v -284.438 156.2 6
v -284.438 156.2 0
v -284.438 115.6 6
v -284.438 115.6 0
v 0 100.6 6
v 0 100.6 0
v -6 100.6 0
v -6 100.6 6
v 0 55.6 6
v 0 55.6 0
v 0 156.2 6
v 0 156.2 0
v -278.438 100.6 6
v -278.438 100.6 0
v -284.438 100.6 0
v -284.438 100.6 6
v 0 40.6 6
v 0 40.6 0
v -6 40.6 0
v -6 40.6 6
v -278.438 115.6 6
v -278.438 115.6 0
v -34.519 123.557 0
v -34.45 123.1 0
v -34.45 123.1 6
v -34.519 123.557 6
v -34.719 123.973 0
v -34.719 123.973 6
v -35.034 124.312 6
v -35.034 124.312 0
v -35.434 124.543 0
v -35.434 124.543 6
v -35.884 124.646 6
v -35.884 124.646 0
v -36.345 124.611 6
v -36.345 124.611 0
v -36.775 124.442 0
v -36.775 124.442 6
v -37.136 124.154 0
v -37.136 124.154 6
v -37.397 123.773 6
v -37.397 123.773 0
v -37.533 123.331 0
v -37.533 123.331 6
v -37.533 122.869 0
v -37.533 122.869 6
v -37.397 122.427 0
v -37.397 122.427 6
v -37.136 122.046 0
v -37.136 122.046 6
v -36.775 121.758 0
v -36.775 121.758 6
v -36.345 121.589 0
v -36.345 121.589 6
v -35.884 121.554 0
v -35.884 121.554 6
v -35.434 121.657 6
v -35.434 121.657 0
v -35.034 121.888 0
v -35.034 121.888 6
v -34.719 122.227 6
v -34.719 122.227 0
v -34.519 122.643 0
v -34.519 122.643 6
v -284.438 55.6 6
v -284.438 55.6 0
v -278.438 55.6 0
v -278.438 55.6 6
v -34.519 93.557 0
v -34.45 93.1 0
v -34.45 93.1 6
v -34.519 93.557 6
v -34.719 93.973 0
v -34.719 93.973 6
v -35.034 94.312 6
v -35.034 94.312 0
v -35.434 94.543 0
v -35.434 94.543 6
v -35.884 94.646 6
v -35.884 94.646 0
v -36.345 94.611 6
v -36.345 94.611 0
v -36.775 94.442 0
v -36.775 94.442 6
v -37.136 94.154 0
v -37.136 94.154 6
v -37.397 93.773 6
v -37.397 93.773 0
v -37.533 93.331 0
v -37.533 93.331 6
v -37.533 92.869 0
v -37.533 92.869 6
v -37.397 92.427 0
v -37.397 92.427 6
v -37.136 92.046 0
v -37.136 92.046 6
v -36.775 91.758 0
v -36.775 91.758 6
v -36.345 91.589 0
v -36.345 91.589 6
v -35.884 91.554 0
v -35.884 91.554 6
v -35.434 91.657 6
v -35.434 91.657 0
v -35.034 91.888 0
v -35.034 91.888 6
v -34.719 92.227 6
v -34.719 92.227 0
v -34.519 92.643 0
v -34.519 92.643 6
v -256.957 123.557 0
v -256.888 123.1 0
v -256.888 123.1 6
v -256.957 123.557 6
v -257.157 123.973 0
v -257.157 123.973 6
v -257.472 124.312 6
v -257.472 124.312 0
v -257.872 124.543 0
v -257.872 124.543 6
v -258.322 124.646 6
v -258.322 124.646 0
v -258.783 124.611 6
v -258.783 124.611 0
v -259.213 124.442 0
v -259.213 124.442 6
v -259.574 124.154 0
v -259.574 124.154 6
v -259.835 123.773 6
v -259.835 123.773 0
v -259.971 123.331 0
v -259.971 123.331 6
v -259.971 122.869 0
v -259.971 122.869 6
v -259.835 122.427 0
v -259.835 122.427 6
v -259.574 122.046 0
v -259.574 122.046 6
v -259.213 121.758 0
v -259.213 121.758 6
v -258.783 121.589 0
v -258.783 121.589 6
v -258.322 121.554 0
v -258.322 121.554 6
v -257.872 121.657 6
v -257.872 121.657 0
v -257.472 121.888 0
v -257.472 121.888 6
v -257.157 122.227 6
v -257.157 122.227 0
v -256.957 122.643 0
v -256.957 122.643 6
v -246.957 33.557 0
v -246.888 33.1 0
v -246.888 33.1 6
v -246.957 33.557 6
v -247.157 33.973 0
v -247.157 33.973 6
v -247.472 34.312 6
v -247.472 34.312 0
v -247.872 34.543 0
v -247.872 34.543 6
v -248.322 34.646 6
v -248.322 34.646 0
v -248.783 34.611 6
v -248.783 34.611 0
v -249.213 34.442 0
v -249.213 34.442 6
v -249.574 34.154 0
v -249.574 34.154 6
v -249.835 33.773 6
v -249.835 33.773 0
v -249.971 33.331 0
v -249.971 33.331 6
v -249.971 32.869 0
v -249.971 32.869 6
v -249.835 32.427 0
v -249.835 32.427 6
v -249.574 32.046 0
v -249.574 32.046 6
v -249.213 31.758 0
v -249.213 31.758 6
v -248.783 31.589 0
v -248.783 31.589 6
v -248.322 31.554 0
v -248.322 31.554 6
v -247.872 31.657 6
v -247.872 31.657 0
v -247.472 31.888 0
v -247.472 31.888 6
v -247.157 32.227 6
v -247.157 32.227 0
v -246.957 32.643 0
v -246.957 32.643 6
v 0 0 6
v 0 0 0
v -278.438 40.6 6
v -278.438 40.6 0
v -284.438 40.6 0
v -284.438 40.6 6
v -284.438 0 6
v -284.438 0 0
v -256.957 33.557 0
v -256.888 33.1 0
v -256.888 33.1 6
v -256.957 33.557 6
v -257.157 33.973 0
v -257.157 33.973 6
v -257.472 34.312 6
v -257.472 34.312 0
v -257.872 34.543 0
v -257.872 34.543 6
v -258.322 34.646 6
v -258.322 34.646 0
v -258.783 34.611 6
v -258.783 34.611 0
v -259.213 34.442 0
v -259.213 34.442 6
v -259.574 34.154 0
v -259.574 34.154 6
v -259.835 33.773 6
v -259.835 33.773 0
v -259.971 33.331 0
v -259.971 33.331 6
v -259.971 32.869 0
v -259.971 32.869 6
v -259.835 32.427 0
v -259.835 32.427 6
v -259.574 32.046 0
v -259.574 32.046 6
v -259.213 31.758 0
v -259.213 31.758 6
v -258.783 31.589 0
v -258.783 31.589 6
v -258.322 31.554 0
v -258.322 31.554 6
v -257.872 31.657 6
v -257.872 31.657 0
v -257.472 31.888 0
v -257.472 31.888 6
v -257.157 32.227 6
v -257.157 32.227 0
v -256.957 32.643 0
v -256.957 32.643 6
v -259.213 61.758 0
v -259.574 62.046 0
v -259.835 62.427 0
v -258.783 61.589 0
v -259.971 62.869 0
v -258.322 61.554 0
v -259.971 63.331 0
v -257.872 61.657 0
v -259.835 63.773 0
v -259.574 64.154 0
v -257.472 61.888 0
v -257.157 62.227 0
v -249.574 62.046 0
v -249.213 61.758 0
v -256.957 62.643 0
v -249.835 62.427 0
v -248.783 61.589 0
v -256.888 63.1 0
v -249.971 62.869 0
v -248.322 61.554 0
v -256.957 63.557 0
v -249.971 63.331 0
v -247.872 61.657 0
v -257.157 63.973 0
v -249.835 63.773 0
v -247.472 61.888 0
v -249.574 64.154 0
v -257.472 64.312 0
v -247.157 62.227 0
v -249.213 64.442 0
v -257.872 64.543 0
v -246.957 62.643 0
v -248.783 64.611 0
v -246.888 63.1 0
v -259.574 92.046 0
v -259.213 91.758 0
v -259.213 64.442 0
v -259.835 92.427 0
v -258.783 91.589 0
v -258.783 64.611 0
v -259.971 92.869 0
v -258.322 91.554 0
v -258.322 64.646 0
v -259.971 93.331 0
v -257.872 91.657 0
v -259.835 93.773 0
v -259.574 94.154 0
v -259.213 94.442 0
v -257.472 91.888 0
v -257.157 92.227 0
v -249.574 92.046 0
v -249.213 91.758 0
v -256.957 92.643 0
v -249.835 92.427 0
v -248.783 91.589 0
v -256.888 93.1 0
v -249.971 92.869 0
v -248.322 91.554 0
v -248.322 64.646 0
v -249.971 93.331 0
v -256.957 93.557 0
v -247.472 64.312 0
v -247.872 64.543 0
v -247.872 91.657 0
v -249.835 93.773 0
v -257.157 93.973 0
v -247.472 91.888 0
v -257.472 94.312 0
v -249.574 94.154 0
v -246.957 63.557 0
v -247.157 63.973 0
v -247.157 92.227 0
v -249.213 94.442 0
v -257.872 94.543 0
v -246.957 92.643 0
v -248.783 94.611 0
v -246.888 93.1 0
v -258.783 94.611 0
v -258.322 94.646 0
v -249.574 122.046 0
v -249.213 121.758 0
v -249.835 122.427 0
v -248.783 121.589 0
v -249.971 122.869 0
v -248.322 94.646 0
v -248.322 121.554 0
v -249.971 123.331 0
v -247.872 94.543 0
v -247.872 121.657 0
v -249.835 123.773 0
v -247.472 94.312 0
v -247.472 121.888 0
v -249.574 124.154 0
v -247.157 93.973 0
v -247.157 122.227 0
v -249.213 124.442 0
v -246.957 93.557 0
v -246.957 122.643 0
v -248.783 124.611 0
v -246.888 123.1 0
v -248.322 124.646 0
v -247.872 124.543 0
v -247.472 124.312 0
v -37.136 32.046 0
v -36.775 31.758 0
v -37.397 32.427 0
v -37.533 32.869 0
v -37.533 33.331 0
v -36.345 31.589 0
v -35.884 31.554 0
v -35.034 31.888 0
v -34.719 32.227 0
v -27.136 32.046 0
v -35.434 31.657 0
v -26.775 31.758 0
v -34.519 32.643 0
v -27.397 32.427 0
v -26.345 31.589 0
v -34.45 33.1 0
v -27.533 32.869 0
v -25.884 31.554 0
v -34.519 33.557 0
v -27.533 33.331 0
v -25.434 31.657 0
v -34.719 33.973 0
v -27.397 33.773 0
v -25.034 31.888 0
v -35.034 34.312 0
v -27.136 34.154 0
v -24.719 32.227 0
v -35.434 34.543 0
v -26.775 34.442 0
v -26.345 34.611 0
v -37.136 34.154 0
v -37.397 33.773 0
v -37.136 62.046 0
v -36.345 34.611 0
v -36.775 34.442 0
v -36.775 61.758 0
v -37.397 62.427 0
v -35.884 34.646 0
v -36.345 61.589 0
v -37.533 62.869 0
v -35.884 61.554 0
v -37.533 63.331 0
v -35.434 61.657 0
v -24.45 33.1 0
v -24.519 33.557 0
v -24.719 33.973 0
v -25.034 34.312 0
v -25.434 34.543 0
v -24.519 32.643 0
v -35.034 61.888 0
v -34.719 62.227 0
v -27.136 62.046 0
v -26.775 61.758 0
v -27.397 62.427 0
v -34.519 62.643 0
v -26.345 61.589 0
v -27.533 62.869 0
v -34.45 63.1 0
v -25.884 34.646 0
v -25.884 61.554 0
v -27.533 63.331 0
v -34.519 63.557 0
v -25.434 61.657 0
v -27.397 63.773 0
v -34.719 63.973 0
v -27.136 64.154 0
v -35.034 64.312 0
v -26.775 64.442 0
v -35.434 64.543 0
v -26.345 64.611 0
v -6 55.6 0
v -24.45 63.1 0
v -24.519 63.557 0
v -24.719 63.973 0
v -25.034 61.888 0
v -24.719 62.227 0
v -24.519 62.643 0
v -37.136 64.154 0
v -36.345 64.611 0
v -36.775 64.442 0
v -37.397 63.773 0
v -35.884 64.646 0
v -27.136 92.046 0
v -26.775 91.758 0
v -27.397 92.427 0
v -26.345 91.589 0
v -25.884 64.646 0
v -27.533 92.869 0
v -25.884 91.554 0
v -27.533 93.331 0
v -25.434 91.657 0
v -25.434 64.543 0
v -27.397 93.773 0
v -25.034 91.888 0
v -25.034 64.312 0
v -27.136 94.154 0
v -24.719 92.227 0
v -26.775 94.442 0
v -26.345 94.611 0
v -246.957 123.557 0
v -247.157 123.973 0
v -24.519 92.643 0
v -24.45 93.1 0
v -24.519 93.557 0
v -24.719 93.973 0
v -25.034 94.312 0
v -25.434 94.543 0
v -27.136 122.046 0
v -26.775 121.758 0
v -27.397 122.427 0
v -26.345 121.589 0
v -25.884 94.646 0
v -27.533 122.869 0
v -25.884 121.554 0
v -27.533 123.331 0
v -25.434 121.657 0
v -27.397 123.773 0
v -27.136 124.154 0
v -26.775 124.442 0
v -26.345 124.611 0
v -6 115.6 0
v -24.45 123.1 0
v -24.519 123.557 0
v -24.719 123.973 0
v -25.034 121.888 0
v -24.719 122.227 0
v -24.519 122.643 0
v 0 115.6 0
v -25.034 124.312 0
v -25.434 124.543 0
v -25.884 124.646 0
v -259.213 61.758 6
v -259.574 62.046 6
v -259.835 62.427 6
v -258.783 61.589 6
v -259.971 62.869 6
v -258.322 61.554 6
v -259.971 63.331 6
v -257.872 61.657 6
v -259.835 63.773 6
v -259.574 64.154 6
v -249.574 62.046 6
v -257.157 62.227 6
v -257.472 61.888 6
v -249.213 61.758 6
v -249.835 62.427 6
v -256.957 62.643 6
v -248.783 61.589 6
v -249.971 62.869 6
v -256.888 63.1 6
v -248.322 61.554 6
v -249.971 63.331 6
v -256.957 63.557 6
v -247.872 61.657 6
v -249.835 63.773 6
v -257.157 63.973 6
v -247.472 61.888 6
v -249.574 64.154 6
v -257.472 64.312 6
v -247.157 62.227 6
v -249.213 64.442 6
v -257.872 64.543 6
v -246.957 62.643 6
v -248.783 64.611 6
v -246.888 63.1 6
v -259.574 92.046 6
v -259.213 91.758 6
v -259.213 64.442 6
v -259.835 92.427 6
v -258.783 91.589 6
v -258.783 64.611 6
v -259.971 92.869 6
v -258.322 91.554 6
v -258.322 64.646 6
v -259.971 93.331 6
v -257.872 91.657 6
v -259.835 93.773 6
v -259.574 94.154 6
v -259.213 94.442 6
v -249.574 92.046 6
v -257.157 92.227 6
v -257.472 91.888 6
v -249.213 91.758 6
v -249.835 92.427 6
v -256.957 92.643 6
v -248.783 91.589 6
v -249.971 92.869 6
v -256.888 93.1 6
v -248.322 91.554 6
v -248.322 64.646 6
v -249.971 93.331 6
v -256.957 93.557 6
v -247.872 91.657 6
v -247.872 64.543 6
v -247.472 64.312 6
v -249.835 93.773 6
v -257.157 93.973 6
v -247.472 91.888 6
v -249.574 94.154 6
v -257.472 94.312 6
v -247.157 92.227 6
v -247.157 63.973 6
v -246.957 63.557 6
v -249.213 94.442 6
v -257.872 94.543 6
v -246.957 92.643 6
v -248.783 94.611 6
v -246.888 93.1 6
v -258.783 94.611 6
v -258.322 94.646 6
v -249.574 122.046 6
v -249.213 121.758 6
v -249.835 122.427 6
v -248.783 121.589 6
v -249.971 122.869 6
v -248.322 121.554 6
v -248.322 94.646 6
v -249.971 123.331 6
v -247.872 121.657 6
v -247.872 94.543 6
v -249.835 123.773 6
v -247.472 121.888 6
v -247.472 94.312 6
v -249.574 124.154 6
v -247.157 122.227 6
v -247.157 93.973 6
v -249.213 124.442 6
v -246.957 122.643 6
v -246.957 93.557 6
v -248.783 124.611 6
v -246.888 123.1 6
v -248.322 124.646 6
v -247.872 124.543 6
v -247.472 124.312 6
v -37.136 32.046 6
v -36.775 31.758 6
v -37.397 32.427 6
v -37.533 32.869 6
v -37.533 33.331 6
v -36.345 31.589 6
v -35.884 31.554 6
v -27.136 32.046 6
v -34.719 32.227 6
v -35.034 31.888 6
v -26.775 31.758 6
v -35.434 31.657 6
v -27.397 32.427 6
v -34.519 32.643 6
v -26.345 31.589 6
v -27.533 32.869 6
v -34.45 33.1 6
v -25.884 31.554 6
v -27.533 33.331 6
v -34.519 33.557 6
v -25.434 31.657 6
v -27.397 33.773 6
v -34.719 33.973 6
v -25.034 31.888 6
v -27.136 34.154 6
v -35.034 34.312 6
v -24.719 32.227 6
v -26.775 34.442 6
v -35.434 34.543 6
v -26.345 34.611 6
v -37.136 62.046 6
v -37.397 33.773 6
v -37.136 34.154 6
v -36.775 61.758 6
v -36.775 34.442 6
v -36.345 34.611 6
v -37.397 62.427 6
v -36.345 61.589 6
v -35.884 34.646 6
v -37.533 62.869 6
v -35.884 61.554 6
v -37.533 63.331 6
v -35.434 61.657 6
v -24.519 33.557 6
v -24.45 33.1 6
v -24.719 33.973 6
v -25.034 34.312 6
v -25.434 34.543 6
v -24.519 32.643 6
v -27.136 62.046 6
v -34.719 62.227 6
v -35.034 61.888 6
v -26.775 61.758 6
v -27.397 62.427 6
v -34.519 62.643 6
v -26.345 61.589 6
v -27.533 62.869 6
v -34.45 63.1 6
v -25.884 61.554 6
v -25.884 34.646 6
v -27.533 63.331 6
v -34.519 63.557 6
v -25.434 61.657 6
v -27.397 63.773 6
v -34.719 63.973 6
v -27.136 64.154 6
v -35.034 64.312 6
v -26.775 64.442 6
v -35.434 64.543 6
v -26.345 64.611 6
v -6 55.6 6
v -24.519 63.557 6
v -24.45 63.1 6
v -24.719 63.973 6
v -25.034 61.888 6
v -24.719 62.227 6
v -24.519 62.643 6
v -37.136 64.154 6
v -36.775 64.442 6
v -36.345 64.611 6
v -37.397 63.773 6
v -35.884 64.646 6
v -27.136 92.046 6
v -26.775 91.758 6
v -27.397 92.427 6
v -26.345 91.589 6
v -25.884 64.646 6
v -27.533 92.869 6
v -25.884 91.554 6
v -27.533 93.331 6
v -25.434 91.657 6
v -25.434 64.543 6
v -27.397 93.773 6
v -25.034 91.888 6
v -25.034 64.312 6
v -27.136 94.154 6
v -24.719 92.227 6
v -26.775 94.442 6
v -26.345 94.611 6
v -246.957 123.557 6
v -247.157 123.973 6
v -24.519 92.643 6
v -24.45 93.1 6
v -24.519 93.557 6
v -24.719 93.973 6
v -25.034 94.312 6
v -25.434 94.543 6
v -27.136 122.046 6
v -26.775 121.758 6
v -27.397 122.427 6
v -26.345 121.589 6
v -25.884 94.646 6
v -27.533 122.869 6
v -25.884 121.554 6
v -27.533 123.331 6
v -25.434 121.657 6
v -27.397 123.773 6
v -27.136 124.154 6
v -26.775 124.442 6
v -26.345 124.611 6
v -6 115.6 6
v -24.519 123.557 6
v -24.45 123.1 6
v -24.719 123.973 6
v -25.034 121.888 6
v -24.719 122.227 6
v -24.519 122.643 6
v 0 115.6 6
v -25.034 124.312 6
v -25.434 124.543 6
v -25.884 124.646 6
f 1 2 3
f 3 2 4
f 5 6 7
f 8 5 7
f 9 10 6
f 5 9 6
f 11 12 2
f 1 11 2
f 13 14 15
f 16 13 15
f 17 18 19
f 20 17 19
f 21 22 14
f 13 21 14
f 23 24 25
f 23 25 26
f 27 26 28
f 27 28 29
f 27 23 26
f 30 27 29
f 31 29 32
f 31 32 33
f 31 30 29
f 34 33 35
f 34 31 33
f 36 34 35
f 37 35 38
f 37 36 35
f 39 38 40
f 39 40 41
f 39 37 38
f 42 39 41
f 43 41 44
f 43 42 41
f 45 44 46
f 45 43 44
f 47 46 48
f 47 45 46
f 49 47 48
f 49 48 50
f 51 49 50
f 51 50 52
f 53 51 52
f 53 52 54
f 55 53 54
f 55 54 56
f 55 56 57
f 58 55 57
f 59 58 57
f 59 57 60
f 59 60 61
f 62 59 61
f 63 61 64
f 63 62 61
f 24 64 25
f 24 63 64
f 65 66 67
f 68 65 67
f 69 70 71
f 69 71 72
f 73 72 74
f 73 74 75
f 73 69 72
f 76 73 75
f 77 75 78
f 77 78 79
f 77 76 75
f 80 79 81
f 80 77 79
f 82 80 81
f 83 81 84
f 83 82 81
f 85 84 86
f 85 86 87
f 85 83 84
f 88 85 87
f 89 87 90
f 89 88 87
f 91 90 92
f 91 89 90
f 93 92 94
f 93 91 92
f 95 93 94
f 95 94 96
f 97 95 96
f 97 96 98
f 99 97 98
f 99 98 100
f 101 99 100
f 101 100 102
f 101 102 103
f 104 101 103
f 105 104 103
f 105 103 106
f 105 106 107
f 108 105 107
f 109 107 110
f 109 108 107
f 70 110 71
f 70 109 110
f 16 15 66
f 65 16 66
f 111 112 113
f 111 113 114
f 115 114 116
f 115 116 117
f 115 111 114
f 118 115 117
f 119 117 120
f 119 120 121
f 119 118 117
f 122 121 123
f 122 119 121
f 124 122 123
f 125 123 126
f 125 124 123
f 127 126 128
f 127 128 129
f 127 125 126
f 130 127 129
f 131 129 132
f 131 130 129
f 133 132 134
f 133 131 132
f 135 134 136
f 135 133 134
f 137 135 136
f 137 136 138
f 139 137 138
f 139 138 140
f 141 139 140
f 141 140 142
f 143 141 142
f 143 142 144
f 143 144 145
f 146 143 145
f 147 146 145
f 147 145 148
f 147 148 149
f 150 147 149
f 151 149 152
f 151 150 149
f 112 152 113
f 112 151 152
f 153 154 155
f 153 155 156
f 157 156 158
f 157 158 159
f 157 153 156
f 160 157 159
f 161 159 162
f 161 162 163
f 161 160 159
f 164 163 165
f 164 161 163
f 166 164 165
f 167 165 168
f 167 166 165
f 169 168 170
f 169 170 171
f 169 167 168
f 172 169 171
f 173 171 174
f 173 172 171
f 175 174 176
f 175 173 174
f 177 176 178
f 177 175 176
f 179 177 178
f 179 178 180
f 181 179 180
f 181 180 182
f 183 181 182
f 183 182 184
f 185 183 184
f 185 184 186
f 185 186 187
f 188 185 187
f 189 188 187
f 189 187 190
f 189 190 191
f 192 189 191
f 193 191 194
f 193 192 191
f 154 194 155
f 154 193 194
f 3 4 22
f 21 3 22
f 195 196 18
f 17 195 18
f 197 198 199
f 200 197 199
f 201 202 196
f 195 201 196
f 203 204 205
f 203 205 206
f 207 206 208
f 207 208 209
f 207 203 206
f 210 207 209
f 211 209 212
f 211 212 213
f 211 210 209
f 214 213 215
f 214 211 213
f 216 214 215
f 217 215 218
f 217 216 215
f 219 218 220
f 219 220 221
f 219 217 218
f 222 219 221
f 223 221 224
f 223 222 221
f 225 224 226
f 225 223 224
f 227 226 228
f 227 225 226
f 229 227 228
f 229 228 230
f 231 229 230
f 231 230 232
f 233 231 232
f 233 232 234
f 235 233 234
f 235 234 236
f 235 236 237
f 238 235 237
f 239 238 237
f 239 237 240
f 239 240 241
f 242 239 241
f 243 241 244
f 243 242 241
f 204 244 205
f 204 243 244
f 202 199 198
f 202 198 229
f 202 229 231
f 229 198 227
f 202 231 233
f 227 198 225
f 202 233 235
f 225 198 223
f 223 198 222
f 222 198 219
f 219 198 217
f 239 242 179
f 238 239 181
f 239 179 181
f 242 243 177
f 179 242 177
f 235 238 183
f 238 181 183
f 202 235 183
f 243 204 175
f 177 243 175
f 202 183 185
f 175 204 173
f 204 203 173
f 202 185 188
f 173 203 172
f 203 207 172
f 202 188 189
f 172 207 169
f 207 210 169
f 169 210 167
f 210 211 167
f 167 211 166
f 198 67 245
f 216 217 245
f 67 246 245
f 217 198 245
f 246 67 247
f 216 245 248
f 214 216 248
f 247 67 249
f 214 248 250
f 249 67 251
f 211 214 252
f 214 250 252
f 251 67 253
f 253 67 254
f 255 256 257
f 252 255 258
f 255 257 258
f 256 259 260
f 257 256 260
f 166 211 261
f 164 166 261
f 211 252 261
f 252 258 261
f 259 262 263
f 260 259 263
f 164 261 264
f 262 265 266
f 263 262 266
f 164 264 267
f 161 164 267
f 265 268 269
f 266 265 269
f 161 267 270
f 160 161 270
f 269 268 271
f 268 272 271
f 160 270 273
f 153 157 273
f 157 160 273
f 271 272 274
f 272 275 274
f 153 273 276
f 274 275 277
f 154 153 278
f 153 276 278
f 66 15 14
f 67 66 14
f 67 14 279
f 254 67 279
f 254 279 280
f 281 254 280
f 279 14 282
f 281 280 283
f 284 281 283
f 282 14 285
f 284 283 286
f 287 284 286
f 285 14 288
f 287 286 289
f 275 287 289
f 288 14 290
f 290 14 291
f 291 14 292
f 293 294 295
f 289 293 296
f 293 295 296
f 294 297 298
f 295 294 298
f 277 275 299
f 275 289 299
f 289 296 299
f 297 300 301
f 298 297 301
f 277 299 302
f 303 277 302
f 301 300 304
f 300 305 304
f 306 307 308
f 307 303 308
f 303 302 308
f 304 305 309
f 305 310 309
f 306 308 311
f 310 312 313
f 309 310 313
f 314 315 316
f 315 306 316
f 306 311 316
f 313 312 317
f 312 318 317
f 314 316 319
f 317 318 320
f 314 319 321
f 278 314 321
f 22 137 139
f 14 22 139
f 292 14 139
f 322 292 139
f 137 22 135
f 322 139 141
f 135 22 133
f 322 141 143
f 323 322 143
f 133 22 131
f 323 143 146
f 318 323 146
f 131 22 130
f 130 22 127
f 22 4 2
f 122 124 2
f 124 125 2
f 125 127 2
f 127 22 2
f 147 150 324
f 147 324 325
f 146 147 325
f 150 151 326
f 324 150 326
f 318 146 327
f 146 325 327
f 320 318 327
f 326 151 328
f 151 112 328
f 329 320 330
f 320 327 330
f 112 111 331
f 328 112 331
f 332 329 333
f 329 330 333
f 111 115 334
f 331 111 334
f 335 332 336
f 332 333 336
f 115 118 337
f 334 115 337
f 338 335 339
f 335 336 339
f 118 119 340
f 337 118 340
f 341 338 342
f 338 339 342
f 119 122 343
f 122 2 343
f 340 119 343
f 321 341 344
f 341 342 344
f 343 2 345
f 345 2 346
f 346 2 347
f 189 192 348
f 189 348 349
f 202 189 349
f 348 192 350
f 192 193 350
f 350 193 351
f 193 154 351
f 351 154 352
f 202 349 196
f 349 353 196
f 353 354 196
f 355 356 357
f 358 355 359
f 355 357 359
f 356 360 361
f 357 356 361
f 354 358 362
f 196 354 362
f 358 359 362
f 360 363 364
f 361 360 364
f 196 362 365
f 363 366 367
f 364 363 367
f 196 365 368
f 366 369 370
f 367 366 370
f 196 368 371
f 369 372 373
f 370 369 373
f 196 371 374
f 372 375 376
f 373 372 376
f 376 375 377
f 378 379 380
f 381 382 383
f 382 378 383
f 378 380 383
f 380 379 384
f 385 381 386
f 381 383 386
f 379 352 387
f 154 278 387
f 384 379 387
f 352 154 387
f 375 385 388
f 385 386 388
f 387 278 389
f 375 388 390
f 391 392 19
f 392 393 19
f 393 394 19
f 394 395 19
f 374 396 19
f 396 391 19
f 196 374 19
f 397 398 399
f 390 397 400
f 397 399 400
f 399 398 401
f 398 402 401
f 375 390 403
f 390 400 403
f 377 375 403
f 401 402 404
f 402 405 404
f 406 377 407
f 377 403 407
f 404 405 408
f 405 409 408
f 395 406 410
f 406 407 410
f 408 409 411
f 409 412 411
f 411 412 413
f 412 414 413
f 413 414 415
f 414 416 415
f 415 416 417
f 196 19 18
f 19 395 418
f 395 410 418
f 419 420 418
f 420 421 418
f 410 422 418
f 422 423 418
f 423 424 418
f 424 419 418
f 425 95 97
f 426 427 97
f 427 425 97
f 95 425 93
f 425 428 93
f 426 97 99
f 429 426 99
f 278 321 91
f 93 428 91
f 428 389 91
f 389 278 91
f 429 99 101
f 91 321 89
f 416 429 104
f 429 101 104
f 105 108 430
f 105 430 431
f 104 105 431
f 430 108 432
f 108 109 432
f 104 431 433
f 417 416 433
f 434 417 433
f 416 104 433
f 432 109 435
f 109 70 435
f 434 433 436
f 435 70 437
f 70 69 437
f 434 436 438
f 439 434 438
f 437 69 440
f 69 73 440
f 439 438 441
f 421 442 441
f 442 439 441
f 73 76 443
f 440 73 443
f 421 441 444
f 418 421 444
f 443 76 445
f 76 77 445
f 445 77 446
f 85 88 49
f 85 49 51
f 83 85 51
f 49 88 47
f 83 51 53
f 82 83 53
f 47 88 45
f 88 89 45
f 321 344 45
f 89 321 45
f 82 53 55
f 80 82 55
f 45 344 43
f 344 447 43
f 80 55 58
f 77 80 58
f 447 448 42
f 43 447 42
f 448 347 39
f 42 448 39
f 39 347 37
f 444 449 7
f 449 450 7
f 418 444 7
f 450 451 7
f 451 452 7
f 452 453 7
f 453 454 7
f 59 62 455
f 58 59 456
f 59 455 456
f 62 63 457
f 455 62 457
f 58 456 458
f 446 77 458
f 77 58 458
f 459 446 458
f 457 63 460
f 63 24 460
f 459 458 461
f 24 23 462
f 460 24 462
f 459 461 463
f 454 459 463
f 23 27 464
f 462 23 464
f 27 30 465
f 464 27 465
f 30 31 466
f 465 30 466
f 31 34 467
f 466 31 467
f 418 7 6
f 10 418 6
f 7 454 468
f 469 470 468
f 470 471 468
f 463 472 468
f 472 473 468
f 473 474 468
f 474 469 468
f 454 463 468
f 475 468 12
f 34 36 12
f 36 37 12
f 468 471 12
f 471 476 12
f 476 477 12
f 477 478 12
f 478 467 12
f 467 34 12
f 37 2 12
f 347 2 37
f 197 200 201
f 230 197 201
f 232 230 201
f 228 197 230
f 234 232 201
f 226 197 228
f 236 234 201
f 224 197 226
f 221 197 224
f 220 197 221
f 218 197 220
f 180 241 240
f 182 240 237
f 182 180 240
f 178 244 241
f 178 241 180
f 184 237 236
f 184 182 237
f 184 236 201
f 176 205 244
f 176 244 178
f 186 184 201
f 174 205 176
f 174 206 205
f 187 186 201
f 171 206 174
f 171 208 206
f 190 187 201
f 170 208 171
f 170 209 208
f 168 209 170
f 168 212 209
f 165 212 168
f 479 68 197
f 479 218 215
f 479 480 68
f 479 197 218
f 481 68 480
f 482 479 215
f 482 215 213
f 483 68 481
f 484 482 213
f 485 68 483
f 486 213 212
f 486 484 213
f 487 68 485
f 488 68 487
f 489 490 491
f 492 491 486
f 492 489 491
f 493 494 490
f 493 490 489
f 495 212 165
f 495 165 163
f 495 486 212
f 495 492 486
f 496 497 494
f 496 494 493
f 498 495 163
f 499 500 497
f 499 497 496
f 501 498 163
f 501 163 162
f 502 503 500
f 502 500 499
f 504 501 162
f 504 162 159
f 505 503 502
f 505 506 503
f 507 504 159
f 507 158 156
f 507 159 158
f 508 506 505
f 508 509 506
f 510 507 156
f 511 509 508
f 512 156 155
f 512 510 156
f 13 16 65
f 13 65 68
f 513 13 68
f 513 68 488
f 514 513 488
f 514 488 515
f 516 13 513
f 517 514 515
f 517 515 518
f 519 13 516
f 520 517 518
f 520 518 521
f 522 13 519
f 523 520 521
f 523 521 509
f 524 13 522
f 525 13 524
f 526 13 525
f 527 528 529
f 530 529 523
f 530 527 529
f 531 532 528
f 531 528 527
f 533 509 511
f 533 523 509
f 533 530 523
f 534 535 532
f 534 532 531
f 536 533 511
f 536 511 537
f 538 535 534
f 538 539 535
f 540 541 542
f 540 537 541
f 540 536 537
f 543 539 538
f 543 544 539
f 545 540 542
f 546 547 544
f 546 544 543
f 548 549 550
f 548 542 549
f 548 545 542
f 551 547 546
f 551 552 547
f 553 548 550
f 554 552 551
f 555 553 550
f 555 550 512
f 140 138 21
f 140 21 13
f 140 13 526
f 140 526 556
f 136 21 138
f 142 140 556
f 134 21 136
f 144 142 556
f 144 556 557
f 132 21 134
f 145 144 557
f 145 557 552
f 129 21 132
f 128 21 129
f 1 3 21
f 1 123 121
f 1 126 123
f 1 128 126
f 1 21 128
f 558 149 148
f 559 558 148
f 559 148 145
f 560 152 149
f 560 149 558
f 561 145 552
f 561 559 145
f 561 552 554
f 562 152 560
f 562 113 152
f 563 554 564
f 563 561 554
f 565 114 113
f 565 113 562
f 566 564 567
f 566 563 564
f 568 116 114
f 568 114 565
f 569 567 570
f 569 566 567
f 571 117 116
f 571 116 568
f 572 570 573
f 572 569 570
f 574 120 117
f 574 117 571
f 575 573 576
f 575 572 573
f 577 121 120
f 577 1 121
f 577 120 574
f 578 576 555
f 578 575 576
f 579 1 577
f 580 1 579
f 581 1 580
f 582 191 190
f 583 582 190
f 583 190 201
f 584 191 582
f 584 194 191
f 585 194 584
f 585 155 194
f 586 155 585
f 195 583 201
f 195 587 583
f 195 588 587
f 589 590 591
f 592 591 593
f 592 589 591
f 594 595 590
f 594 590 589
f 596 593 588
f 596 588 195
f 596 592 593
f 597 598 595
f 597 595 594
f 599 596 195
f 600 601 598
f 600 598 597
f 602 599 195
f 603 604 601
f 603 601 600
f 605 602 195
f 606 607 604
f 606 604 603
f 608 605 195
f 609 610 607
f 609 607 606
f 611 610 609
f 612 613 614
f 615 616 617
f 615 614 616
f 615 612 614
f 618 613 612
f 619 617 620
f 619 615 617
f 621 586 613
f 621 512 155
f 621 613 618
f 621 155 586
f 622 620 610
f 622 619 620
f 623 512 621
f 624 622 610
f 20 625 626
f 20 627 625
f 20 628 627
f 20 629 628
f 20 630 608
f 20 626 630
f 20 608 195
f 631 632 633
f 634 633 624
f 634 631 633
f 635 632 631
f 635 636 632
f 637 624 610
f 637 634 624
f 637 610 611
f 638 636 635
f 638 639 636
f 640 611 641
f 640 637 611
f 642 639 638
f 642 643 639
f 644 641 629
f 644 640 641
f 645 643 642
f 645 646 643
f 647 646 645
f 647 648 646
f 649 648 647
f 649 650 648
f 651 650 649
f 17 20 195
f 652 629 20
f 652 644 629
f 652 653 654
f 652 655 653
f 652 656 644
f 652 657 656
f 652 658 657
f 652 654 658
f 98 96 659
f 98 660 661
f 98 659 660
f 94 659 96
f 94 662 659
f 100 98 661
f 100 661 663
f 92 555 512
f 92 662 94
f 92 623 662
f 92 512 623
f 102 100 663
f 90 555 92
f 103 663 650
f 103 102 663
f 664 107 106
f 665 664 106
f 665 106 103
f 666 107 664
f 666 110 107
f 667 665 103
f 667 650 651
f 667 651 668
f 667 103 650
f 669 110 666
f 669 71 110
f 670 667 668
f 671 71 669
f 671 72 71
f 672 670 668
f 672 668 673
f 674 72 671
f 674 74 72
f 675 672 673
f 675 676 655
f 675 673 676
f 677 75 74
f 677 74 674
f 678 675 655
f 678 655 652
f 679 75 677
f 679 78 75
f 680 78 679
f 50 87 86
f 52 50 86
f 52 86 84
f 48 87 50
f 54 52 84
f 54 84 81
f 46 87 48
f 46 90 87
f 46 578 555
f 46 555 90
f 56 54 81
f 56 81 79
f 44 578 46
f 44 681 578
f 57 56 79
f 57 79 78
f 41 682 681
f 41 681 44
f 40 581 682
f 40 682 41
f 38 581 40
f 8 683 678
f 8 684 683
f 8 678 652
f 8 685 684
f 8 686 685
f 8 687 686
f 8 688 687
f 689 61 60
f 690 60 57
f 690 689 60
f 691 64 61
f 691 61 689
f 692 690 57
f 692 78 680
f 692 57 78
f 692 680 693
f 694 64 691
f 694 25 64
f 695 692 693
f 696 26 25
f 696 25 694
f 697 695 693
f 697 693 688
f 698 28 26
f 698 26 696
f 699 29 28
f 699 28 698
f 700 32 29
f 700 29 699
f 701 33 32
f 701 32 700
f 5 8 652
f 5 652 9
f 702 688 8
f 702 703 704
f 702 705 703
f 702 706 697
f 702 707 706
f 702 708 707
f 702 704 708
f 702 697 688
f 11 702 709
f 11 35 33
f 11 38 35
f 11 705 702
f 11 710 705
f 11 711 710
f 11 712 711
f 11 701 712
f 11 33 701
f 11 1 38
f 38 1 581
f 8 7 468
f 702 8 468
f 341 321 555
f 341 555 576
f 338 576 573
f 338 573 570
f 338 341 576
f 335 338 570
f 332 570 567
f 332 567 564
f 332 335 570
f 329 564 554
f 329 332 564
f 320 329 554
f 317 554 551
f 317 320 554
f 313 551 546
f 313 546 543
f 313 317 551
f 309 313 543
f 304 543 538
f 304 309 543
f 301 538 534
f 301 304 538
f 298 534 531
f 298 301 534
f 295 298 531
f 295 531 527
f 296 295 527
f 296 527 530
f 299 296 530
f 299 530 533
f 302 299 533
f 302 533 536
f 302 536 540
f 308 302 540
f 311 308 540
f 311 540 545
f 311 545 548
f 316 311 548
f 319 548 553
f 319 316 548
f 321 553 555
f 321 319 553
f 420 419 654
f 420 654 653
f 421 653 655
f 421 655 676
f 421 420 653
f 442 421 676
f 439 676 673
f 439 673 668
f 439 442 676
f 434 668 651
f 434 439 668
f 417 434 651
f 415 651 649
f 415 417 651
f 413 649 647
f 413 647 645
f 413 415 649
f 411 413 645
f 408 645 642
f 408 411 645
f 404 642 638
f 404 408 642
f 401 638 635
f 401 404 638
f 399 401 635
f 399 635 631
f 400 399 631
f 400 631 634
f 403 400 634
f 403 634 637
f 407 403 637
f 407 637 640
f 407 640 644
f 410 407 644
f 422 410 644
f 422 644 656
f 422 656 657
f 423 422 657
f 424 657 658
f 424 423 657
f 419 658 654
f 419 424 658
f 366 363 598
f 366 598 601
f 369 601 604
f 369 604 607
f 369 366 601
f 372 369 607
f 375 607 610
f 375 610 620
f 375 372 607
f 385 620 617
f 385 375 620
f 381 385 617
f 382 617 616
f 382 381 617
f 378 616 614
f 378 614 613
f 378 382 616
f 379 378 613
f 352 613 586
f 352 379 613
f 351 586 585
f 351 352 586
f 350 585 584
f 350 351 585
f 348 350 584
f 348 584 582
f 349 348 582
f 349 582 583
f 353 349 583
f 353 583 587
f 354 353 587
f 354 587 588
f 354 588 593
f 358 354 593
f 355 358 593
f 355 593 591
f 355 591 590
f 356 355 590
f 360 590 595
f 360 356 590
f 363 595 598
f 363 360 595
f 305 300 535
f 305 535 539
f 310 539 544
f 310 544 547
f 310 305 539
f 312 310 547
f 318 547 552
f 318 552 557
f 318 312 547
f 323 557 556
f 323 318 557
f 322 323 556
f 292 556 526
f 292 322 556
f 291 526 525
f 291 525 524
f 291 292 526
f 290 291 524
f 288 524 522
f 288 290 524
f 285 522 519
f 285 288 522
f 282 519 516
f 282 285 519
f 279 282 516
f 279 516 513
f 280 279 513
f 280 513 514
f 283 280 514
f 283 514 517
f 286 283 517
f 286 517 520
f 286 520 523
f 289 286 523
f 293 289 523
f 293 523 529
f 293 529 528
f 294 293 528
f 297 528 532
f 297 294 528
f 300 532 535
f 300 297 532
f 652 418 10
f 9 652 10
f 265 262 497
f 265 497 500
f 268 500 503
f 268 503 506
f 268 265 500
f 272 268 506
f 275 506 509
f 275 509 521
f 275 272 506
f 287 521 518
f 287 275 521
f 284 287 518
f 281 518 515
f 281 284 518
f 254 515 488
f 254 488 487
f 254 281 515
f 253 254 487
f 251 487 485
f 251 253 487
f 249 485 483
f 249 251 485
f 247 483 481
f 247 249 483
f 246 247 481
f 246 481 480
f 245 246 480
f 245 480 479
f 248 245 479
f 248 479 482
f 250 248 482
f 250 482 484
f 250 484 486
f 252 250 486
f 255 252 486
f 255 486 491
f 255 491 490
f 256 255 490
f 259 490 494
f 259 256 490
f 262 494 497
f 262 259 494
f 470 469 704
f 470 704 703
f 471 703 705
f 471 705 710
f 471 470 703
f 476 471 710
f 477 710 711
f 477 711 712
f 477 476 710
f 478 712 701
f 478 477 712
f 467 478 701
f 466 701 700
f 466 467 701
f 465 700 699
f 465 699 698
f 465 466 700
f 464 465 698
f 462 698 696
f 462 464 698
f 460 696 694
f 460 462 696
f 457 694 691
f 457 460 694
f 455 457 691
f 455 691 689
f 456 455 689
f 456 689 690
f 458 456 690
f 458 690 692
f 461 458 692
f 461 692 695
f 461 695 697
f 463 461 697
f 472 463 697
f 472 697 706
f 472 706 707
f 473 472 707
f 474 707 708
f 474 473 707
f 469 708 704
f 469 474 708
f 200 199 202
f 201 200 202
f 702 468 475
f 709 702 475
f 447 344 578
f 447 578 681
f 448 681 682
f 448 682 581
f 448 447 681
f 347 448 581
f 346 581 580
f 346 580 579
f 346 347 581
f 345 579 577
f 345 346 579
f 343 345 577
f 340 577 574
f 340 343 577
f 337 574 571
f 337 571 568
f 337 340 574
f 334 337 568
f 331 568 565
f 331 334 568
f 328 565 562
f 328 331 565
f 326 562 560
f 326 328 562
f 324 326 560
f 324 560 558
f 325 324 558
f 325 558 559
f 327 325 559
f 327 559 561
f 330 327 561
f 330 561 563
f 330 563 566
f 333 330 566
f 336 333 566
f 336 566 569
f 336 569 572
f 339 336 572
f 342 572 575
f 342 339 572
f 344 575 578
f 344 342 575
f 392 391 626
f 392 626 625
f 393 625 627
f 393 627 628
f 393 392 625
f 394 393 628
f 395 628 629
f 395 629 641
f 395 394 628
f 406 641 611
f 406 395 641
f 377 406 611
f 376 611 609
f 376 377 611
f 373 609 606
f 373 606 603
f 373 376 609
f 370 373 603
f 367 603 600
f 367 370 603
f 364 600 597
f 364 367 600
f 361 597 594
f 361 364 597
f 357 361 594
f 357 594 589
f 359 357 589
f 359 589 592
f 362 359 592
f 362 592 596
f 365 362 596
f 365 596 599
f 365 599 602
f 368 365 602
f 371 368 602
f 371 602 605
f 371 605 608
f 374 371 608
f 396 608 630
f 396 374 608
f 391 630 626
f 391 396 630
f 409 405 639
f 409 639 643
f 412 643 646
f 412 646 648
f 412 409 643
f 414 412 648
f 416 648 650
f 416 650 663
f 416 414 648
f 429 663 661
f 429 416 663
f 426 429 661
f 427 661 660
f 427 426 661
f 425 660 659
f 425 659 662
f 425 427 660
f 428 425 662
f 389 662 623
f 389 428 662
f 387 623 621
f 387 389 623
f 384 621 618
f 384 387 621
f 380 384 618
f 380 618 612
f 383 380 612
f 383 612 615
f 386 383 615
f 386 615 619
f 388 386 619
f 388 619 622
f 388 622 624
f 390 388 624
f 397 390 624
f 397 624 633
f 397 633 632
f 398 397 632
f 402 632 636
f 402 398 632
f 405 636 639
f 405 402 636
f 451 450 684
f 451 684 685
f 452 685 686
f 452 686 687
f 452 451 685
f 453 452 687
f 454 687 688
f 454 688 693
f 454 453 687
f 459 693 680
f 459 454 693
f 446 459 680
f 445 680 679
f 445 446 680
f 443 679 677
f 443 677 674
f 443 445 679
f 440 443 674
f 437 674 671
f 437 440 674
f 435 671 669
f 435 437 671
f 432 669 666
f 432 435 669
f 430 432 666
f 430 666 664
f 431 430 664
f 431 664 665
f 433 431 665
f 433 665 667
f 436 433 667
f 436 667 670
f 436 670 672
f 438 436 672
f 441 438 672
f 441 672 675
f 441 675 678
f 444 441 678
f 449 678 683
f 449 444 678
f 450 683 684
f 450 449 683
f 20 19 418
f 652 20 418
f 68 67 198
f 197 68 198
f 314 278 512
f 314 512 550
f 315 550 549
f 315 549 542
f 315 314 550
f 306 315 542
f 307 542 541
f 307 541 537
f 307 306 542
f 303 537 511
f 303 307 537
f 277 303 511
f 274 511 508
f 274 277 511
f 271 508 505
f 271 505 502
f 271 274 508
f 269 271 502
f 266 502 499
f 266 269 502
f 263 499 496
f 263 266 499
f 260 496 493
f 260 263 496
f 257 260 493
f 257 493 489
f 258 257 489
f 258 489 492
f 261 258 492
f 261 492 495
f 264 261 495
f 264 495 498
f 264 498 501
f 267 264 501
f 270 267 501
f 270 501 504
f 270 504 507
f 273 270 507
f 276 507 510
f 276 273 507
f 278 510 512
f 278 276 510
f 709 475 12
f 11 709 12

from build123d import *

# Parameters (mm, degrees)
F0_R     = 1.55
F1_DEPTH = 6


with BuildPart() as f1:
    # F0 (on Top) → F1 (new body)
    with BuildSketch(Plane.XY):
        Polygon((-284.438, 0), (0, 0), (0, 40.6), (-6, 40.6), (-6, 55.6), (0, 55.6), (0, 100.6), (-6, 100.6), (-6, 115.6), (0, 115.6), (0, 156.2), (-284.438, 156.2), (-284.438, 115.6), (-278.438, 115.6), (-278.438, 100.6), (-284.438, 100.6), (-284.438, 55.6), (-278.438, 55.6), (-278.438, 40.6), (-284.438, 40.6), align=None)
        with Locations((-258.438, 33.1)):
            Circle(F0_R, mode=Mode.SUBTRACT)
        with Locations((-248.438, 33.1)):
            Circle(F0_R, mode=Mode.SUBTRACT)
        with Locations((-258.438, 63.1)):
            Circle(F0_R, mode=Mode.SUBTRACT)
        with Locations((-248.438, 63.1)):
            Circle(F0_R, mode=Mode.SUBTRACT)
        with Locations((-36, 33.1)):
            Circle(F0_R, mode=Mode.SUBTRACT)
        with Locations((-26, 33.1)):
            Circle(F0_R, mode=Mode.SUBTRACT)
        with Locations((-36, 63.1)):
            Circle(F0_R, mode=Mode.SUBTRACT)
        with Locations((-26, 63.1)):
            Circle(F0_R, mode=Mode.SUBTRACT)
        with Locations((-258.438, 93.1)):
            Circle(F0_R, mode=Mode.SUBTRACT)
        with Locations((-248.438, 93.1)):
            Circle(F0_R, mode=Mode.SUBTRACT)
        with Locations((-258.438, 123.1)):
            Circle(F0_R, mode=Mode.SUBTRACT)
        with Locations((-248.438, 123.1)):
            Circle(F0_R, mode=Mode.SUBTRACT)
        with Locations((-36, 93.1)):
            Circle(F0_R, mode=Mode.SUBTRACT)
        with Locations((-26, 93.1)):
            Circle(F0_R, mode=Mode.SUBTRACT)
        with Locations((-36, 123.1)):
            Circle(F0_R, mode=Mode.SUBTRACT)
        with Locations((-26, 123.1)):
            Circle(F0_R, mode=Mode.SUBTRACT)
    extrude(amount=F1_DEPTH)


solid = f1.part
